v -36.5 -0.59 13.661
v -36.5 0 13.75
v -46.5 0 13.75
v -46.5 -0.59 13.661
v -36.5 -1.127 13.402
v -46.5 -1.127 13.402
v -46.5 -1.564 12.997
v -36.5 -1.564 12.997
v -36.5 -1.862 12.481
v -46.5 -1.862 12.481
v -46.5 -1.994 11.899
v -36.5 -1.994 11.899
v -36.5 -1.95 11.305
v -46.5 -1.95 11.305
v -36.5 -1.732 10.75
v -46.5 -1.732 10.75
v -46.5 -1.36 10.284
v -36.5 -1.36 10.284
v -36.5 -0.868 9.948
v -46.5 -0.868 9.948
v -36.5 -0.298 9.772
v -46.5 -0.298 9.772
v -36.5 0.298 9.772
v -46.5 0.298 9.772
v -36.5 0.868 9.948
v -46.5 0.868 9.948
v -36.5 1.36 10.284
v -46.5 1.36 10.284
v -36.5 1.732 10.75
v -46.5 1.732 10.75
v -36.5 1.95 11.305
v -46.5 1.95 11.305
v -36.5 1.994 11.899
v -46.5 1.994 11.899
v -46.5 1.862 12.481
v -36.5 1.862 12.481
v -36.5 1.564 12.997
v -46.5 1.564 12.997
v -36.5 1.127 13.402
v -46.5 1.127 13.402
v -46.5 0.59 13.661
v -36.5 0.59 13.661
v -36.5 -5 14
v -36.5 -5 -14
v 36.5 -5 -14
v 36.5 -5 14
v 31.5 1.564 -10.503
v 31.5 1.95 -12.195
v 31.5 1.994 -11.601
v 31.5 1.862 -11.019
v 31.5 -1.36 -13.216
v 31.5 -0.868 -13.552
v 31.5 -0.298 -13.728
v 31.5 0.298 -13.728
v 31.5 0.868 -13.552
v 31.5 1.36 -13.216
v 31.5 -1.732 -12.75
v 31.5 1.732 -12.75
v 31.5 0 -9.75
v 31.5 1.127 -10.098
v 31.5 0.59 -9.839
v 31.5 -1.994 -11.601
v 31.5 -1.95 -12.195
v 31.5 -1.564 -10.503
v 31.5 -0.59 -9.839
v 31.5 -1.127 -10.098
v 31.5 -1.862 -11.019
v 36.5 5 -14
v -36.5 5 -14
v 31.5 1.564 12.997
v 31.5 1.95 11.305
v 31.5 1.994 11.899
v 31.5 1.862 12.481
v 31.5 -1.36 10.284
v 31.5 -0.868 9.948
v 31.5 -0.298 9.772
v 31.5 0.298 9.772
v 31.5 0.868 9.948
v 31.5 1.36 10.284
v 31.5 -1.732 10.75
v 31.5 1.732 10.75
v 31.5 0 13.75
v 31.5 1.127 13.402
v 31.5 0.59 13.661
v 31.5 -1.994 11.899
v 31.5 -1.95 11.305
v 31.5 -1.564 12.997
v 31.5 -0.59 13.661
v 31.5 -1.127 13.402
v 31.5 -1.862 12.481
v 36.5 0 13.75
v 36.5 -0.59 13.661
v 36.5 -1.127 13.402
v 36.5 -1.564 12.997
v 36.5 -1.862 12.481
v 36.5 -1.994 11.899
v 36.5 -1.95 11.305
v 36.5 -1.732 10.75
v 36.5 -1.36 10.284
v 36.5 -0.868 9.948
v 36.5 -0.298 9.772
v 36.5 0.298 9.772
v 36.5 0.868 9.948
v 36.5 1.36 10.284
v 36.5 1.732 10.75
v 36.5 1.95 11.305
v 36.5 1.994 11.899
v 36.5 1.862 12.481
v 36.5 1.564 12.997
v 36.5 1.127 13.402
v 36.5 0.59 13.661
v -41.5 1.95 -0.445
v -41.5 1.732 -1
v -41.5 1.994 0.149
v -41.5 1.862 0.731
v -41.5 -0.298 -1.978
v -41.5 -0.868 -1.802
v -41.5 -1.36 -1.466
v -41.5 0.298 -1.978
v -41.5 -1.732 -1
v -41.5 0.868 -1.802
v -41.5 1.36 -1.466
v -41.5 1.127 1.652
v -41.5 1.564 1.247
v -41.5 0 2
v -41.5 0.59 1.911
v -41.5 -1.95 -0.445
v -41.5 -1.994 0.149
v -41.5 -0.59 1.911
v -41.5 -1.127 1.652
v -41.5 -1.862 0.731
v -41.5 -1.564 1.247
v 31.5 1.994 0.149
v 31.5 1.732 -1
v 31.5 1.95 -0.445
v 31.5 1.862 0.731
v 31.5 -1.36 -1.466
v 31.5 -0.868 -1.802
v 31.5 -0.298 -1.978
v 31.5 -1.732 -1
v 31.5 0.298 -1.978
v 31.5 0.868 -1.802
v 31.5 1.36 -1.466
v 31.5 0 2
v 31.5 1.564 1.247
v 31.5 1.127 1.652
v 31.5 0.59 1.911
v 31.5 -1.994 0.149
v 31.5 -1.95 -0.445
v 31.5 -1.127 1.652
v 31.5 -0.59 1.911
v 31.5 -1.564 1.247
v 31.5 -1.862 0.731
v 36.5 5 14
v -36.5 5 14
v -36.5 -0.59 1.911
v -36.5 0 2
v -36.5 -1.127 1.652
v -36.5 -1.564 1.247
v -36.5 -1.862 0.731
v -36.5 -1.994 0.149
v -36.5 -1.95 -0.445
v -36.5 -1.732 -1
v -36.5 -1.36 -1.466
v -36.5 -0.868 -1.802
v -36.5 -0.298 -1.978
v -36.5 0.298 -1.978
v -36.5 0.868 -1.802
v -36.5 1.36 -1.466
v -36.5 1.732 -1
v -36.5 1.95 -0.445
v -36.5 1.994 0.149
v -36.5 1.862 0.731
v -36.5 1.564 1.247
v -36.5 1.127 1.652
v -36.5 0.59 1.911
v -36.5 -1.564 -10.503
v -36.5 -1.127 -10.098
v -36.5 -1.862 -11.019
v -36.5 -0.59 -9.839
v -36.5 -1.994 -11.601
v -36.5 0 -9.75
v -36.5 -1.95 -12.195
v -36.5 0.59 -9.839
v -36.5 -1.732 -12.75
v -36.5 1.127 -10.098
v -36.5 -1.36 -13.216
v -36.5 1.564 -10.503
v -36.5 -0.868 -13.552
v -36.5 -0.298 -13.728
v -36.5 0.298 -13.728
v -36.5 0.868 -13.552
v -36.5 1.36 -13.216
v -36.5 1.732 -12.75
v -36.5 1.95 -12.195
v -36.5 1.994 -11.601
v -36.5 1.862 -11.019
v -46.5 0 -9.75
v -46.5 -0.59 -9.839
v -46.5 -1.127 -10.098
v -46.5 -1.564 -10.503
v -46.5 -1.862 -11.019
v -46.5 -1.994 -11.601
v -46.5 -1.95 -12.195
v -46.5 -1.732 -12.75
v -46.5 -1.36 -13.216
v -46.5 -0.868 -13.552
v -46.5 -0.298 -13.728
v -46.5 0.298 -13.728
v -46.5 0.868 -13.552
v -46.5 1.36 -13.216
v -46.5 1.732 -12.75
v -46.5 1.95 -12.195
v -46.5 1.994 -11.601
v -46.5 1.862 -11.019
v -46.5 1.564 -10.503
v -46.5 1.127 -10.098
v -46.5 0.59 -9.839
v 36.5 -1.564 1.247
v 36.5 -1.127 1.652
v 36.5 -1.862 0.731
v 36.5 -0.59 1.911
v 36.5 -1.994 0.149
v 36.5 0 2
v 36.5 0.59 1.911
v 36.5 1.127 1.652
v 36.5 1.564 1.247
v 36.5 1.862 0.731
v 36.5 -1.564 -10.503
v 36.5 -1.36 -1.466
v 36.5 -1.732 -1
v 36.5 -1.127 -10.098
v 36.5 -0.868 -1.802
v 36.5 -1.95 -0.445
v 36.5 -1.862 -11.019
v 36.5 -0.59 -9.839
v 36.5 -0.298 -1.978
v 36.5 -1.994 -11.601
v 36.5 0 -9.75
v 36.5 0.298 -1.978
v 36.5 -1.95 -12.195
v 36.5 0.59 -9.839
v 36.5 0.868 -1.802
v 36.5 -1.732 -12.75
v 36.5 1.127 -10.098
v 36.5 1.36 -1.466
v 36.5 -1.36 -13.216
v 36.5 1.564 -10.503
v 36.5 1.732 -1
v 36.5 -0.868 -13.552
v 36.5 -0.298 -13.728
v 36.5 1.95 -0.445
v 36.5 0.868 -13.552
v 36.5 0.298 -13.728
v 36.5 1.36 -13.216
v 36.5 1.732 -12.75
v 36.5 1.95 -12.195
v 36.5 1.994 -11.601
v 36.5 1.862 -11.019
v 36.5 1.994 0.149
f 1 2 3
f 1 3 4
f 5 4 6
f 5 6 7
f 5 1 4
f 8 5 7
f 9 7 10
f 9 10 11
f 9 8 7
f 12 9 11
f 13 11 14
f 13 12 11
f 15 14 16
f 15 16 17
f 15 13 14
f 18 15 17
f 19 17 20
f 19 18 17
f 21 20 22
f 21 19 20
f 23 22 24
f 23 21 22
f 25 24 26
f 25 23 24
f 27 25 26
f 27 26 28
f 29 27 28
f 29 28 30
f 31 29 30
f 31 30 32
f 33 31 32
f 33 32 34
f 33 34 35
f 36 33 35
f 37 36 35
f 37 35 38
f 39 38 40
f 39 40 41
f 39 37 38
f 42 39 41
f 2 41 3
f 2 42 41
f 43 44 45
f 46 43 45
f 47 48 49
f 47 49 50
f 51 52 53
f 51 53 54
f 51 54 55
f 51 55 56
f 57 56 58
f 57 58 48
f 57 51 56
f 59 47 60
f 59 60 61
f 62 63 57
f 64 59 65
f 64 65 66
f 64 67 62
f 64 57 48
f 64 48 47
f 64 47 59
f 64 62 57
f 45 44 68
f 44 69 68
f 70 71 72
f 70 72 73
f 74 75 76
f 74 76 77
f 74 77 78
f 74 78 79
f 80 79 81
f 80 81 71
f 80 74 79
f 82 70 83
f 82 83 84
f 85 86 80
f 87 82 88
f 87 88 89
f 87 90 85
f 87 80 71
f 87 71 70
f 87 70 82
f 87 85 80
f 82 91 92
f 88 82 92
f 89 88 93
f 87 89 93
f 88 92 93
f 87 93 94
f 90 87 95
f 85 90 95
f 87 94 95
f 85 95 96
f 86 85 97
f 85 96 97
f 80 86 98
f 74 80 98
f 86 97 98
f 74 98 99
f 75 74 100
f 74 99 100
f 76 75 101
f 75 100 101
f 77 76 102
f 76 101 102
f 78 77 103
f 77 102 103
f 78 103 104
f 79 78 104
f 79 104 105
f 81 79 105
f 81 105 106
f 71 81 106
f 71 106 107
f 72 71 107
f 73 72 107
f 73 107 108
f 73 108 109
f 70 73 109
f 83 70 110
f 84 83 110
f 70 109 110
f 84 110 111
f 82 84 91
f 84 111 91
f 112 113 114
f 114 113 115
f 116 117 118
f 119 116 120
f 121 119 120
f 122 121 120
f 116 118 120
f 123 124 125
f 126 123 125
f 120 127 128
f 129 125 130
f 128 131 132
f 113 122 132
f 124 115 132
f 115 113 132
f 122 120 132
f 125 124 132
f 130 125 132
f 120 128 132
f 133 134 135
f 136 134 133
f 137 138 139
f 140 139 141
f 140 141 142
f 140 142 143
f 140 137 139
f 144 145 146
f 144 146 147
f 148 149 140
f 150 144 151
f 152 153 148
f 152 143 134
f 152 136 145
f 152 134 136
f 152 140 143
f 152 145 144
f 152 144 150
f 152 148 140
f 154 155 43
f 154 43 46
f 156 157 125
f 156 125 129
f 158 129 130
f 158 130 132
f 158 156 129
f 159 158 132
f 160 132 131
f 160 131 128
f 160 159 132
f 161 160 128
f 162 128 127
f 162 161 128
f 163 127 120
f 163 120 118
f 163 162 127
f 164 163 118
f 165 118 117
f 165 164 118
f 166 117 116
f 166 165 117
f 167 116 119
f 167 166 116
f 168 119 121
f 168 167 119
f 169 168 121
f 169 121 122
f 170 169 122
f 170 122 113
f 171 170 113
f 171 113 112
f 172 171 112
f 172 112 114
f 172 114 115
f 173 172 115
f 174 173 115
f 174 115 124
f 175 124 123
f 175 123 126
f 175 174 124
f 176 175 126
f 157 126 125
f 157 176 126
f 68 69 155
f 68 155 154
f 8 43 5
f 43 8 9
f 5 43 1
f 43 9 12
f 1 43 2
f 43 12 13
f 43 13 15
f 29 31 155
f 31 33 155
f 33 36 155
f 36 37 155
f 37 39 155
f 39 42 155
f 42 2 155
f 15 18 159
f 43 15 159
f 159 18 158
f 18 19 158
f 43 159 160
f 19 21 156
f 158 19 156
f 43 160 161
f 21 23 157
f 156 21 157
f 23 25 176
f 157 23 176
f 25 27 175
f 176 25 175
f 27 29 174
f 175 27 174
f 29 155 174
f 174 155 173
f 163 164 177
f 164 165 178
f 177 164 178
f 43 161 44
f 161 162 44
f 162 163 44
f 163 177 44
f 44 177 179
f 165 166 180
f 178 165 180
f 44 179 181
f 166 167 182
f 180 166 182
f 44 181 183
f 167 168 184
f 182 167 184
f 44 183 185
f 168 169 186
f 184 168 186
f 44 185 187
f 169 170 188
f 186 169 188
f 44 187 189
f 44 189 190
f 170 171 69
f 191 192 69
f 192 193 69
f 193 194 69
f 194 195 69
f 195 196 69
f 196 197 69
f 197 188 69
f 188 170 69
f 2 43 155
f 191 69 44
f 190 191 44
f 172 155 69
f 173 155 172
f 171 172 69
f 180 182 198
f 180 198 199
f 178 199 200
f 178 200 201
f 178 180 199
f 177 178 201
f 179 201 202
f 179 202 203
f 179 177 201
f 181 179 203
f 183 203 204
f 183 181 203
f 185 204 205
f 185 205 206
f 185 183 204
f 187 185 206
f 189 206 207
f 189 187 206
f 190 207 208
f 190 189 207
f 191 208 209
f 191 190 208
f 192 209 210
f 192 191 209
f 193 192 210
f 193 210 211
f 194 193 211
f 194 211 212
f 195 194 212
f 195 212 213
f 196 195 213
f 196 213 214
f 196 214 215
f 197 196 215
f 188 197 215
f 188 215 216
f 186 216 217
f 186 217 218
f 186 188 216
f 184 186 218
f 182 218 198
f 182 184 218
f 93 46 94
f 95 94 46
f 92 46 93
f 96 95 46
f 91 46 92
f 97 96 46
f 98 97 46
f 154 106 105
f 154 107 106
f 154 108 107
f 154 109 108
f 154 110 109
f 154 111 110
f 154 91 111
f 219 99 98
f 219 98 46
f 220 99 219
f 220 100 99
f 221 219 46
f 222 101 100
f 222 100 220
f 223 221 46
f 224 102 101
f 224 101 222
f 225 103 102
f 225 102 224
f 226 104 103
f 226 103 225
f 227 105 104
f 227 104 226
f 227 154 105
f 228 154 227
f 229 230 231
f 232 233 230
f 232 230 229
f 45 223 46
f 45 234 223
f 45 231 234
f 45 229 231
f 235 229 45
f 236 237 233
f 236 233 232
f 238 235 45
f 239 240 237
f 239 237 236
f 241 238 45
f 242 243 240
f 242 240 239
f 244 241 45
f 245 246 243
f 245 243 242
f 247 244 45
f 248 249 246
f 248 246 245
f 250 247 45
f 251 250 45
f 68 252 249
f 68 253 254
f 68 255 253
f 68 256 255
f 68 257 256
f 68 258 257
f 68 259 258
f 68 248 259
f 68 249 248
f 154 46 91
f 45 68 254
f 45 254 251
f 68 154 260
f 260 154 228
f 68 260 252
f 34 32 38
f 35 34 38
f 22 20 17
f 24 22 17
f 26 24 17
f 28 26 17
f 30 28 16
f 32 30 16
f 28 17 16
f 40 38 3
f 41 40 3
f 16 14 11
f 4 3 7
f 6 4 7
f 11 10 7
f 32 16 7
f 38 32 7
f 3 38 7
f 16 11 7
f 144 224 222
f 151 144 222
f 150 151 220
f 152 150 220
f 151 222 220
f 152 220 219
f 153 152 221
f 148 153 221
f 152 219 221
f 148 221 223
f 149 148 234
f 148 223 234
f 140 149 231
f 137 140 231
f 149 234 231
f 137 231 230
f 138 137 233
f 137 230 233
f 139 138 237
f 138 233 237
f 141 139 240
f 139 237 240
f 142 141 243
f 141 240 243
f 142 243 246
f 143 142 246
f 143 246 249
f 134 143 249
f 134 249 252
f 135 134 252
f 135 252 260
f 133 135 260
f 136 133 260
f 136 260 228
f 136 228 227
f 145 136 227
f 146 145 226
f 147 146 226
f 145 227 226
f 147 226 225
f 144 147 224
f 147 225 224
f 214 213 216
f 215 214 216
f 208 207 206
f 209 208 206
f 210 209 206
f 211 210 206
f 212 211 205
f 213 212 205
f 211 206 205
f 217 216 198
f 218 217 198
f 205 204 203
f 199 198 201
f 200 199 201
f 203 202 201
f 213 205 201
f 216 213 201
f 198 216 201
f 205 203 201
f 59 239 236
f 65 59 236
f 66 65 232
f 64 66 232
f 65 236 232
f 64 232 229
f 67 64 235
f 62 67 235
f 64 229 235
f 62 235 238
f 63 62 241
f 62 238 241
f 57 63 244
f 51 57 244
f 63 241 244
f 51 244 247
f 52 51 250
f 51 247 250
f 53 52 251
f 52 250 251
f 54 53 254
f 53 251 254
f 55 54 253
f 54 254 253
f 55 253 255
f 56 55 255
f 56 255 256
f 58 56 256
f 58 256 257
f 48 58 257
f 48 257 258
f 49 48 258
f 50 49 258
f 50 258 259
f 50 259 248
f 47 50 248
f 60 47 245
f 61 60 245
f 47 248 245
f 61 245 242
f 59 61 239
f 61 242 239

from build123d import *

# Parameters (mm, degrees)
SKETCH2_W           = 73
SKETCH2_H           = 28
BOSS_EXTRUDE1_DEPTH = 5
CUT_EXTRUDE2_START  = 36.5
SKETCH3_R           = 2
CUT_EXTRUDE2_DEPTH  = 5
BOSS_EXTRUDE2_START = -36.5
SKETCH3_2_R         = 2
BOSS_EXTRUDE2_DEPTH = 10
BOSS_EXTRUDE3_START = -36.5
SKETCH3_3_R         = 2
BOSS_EXTRUDE3_DEPTH = 5


with BuildPart() as part:
    # Sketch2 → Boss-Extrude1 (new, symmetric)
    with BuildSketch(Plane(origin=(0, 0, 0), x_dir=(1, 0, 0), z_dir=(0, 1, 0))):
        Rectangle(SKETCH2_W, SKETCH2_H)
    extrude(amount=BOSS_EXTRUDE1_DEPTH, both=True)

    # Sketch3 → Cut-Extrude2 (cut)
    with BuildSketch(Plane(origin=(0, 0, 0), x_dir=(0, 0, -1), z_dir=(1, 0, 0)).offset(CUT_EXTRUDE2_START)):
        with Locations(Location((0, 0, 0), (0, 0, 180))):
            Circle(SKETCH3_R)
        with Locations(Location((11.75, 0, 0), (0, 0, 180))):
            Circle(SKETCH3_R)
        with Locations(Location((-11.75, 0, 0), (0, 0, 180))):
            Circle(SKETCH3_R)
    extrude(amount=-CUT_EXTRUDE2_DEPTH, mode=Mode.SUBTRACT)

    # Sketch3<2> → Boss-Extrude2 (add, symmetric)
    with BuildSketch(Plane(origin=(0, 0, 0), x_dir=(0, 0, -1), z_dir=(1, 0, 0)).offset(BOSS_EXTRUDE2_START)):
        with Locations(Location((11.75, 0, 0), (0, 0, 180))):
            Circle(SKETCH3_2_R)
        with Locations(Location((-11.75, 0, 0), (0, 0, 180))):
            Circle(SKETCH3_2_R)
    extrude(amount=BOSS_EXTRUDE2_DEPTH, both=True)

    # Sketch3<3> → Boss-Extrude3 (add, symmetric)
    with BuildSketch(Plane(origin=(0, 0, 0), x_dir=(0, 0, -1), z_dir=(1, 0, 0)).offset(BOSS_EXTRUDE3_START)):
        with Locations(Location((0, 0, 0), (0, 0, 180))):
            Circle(SKETCH3_3_R)
    extrude(amount=BOSS_EXTRUDE3_DEPTH, both=True)


solid = part.part
